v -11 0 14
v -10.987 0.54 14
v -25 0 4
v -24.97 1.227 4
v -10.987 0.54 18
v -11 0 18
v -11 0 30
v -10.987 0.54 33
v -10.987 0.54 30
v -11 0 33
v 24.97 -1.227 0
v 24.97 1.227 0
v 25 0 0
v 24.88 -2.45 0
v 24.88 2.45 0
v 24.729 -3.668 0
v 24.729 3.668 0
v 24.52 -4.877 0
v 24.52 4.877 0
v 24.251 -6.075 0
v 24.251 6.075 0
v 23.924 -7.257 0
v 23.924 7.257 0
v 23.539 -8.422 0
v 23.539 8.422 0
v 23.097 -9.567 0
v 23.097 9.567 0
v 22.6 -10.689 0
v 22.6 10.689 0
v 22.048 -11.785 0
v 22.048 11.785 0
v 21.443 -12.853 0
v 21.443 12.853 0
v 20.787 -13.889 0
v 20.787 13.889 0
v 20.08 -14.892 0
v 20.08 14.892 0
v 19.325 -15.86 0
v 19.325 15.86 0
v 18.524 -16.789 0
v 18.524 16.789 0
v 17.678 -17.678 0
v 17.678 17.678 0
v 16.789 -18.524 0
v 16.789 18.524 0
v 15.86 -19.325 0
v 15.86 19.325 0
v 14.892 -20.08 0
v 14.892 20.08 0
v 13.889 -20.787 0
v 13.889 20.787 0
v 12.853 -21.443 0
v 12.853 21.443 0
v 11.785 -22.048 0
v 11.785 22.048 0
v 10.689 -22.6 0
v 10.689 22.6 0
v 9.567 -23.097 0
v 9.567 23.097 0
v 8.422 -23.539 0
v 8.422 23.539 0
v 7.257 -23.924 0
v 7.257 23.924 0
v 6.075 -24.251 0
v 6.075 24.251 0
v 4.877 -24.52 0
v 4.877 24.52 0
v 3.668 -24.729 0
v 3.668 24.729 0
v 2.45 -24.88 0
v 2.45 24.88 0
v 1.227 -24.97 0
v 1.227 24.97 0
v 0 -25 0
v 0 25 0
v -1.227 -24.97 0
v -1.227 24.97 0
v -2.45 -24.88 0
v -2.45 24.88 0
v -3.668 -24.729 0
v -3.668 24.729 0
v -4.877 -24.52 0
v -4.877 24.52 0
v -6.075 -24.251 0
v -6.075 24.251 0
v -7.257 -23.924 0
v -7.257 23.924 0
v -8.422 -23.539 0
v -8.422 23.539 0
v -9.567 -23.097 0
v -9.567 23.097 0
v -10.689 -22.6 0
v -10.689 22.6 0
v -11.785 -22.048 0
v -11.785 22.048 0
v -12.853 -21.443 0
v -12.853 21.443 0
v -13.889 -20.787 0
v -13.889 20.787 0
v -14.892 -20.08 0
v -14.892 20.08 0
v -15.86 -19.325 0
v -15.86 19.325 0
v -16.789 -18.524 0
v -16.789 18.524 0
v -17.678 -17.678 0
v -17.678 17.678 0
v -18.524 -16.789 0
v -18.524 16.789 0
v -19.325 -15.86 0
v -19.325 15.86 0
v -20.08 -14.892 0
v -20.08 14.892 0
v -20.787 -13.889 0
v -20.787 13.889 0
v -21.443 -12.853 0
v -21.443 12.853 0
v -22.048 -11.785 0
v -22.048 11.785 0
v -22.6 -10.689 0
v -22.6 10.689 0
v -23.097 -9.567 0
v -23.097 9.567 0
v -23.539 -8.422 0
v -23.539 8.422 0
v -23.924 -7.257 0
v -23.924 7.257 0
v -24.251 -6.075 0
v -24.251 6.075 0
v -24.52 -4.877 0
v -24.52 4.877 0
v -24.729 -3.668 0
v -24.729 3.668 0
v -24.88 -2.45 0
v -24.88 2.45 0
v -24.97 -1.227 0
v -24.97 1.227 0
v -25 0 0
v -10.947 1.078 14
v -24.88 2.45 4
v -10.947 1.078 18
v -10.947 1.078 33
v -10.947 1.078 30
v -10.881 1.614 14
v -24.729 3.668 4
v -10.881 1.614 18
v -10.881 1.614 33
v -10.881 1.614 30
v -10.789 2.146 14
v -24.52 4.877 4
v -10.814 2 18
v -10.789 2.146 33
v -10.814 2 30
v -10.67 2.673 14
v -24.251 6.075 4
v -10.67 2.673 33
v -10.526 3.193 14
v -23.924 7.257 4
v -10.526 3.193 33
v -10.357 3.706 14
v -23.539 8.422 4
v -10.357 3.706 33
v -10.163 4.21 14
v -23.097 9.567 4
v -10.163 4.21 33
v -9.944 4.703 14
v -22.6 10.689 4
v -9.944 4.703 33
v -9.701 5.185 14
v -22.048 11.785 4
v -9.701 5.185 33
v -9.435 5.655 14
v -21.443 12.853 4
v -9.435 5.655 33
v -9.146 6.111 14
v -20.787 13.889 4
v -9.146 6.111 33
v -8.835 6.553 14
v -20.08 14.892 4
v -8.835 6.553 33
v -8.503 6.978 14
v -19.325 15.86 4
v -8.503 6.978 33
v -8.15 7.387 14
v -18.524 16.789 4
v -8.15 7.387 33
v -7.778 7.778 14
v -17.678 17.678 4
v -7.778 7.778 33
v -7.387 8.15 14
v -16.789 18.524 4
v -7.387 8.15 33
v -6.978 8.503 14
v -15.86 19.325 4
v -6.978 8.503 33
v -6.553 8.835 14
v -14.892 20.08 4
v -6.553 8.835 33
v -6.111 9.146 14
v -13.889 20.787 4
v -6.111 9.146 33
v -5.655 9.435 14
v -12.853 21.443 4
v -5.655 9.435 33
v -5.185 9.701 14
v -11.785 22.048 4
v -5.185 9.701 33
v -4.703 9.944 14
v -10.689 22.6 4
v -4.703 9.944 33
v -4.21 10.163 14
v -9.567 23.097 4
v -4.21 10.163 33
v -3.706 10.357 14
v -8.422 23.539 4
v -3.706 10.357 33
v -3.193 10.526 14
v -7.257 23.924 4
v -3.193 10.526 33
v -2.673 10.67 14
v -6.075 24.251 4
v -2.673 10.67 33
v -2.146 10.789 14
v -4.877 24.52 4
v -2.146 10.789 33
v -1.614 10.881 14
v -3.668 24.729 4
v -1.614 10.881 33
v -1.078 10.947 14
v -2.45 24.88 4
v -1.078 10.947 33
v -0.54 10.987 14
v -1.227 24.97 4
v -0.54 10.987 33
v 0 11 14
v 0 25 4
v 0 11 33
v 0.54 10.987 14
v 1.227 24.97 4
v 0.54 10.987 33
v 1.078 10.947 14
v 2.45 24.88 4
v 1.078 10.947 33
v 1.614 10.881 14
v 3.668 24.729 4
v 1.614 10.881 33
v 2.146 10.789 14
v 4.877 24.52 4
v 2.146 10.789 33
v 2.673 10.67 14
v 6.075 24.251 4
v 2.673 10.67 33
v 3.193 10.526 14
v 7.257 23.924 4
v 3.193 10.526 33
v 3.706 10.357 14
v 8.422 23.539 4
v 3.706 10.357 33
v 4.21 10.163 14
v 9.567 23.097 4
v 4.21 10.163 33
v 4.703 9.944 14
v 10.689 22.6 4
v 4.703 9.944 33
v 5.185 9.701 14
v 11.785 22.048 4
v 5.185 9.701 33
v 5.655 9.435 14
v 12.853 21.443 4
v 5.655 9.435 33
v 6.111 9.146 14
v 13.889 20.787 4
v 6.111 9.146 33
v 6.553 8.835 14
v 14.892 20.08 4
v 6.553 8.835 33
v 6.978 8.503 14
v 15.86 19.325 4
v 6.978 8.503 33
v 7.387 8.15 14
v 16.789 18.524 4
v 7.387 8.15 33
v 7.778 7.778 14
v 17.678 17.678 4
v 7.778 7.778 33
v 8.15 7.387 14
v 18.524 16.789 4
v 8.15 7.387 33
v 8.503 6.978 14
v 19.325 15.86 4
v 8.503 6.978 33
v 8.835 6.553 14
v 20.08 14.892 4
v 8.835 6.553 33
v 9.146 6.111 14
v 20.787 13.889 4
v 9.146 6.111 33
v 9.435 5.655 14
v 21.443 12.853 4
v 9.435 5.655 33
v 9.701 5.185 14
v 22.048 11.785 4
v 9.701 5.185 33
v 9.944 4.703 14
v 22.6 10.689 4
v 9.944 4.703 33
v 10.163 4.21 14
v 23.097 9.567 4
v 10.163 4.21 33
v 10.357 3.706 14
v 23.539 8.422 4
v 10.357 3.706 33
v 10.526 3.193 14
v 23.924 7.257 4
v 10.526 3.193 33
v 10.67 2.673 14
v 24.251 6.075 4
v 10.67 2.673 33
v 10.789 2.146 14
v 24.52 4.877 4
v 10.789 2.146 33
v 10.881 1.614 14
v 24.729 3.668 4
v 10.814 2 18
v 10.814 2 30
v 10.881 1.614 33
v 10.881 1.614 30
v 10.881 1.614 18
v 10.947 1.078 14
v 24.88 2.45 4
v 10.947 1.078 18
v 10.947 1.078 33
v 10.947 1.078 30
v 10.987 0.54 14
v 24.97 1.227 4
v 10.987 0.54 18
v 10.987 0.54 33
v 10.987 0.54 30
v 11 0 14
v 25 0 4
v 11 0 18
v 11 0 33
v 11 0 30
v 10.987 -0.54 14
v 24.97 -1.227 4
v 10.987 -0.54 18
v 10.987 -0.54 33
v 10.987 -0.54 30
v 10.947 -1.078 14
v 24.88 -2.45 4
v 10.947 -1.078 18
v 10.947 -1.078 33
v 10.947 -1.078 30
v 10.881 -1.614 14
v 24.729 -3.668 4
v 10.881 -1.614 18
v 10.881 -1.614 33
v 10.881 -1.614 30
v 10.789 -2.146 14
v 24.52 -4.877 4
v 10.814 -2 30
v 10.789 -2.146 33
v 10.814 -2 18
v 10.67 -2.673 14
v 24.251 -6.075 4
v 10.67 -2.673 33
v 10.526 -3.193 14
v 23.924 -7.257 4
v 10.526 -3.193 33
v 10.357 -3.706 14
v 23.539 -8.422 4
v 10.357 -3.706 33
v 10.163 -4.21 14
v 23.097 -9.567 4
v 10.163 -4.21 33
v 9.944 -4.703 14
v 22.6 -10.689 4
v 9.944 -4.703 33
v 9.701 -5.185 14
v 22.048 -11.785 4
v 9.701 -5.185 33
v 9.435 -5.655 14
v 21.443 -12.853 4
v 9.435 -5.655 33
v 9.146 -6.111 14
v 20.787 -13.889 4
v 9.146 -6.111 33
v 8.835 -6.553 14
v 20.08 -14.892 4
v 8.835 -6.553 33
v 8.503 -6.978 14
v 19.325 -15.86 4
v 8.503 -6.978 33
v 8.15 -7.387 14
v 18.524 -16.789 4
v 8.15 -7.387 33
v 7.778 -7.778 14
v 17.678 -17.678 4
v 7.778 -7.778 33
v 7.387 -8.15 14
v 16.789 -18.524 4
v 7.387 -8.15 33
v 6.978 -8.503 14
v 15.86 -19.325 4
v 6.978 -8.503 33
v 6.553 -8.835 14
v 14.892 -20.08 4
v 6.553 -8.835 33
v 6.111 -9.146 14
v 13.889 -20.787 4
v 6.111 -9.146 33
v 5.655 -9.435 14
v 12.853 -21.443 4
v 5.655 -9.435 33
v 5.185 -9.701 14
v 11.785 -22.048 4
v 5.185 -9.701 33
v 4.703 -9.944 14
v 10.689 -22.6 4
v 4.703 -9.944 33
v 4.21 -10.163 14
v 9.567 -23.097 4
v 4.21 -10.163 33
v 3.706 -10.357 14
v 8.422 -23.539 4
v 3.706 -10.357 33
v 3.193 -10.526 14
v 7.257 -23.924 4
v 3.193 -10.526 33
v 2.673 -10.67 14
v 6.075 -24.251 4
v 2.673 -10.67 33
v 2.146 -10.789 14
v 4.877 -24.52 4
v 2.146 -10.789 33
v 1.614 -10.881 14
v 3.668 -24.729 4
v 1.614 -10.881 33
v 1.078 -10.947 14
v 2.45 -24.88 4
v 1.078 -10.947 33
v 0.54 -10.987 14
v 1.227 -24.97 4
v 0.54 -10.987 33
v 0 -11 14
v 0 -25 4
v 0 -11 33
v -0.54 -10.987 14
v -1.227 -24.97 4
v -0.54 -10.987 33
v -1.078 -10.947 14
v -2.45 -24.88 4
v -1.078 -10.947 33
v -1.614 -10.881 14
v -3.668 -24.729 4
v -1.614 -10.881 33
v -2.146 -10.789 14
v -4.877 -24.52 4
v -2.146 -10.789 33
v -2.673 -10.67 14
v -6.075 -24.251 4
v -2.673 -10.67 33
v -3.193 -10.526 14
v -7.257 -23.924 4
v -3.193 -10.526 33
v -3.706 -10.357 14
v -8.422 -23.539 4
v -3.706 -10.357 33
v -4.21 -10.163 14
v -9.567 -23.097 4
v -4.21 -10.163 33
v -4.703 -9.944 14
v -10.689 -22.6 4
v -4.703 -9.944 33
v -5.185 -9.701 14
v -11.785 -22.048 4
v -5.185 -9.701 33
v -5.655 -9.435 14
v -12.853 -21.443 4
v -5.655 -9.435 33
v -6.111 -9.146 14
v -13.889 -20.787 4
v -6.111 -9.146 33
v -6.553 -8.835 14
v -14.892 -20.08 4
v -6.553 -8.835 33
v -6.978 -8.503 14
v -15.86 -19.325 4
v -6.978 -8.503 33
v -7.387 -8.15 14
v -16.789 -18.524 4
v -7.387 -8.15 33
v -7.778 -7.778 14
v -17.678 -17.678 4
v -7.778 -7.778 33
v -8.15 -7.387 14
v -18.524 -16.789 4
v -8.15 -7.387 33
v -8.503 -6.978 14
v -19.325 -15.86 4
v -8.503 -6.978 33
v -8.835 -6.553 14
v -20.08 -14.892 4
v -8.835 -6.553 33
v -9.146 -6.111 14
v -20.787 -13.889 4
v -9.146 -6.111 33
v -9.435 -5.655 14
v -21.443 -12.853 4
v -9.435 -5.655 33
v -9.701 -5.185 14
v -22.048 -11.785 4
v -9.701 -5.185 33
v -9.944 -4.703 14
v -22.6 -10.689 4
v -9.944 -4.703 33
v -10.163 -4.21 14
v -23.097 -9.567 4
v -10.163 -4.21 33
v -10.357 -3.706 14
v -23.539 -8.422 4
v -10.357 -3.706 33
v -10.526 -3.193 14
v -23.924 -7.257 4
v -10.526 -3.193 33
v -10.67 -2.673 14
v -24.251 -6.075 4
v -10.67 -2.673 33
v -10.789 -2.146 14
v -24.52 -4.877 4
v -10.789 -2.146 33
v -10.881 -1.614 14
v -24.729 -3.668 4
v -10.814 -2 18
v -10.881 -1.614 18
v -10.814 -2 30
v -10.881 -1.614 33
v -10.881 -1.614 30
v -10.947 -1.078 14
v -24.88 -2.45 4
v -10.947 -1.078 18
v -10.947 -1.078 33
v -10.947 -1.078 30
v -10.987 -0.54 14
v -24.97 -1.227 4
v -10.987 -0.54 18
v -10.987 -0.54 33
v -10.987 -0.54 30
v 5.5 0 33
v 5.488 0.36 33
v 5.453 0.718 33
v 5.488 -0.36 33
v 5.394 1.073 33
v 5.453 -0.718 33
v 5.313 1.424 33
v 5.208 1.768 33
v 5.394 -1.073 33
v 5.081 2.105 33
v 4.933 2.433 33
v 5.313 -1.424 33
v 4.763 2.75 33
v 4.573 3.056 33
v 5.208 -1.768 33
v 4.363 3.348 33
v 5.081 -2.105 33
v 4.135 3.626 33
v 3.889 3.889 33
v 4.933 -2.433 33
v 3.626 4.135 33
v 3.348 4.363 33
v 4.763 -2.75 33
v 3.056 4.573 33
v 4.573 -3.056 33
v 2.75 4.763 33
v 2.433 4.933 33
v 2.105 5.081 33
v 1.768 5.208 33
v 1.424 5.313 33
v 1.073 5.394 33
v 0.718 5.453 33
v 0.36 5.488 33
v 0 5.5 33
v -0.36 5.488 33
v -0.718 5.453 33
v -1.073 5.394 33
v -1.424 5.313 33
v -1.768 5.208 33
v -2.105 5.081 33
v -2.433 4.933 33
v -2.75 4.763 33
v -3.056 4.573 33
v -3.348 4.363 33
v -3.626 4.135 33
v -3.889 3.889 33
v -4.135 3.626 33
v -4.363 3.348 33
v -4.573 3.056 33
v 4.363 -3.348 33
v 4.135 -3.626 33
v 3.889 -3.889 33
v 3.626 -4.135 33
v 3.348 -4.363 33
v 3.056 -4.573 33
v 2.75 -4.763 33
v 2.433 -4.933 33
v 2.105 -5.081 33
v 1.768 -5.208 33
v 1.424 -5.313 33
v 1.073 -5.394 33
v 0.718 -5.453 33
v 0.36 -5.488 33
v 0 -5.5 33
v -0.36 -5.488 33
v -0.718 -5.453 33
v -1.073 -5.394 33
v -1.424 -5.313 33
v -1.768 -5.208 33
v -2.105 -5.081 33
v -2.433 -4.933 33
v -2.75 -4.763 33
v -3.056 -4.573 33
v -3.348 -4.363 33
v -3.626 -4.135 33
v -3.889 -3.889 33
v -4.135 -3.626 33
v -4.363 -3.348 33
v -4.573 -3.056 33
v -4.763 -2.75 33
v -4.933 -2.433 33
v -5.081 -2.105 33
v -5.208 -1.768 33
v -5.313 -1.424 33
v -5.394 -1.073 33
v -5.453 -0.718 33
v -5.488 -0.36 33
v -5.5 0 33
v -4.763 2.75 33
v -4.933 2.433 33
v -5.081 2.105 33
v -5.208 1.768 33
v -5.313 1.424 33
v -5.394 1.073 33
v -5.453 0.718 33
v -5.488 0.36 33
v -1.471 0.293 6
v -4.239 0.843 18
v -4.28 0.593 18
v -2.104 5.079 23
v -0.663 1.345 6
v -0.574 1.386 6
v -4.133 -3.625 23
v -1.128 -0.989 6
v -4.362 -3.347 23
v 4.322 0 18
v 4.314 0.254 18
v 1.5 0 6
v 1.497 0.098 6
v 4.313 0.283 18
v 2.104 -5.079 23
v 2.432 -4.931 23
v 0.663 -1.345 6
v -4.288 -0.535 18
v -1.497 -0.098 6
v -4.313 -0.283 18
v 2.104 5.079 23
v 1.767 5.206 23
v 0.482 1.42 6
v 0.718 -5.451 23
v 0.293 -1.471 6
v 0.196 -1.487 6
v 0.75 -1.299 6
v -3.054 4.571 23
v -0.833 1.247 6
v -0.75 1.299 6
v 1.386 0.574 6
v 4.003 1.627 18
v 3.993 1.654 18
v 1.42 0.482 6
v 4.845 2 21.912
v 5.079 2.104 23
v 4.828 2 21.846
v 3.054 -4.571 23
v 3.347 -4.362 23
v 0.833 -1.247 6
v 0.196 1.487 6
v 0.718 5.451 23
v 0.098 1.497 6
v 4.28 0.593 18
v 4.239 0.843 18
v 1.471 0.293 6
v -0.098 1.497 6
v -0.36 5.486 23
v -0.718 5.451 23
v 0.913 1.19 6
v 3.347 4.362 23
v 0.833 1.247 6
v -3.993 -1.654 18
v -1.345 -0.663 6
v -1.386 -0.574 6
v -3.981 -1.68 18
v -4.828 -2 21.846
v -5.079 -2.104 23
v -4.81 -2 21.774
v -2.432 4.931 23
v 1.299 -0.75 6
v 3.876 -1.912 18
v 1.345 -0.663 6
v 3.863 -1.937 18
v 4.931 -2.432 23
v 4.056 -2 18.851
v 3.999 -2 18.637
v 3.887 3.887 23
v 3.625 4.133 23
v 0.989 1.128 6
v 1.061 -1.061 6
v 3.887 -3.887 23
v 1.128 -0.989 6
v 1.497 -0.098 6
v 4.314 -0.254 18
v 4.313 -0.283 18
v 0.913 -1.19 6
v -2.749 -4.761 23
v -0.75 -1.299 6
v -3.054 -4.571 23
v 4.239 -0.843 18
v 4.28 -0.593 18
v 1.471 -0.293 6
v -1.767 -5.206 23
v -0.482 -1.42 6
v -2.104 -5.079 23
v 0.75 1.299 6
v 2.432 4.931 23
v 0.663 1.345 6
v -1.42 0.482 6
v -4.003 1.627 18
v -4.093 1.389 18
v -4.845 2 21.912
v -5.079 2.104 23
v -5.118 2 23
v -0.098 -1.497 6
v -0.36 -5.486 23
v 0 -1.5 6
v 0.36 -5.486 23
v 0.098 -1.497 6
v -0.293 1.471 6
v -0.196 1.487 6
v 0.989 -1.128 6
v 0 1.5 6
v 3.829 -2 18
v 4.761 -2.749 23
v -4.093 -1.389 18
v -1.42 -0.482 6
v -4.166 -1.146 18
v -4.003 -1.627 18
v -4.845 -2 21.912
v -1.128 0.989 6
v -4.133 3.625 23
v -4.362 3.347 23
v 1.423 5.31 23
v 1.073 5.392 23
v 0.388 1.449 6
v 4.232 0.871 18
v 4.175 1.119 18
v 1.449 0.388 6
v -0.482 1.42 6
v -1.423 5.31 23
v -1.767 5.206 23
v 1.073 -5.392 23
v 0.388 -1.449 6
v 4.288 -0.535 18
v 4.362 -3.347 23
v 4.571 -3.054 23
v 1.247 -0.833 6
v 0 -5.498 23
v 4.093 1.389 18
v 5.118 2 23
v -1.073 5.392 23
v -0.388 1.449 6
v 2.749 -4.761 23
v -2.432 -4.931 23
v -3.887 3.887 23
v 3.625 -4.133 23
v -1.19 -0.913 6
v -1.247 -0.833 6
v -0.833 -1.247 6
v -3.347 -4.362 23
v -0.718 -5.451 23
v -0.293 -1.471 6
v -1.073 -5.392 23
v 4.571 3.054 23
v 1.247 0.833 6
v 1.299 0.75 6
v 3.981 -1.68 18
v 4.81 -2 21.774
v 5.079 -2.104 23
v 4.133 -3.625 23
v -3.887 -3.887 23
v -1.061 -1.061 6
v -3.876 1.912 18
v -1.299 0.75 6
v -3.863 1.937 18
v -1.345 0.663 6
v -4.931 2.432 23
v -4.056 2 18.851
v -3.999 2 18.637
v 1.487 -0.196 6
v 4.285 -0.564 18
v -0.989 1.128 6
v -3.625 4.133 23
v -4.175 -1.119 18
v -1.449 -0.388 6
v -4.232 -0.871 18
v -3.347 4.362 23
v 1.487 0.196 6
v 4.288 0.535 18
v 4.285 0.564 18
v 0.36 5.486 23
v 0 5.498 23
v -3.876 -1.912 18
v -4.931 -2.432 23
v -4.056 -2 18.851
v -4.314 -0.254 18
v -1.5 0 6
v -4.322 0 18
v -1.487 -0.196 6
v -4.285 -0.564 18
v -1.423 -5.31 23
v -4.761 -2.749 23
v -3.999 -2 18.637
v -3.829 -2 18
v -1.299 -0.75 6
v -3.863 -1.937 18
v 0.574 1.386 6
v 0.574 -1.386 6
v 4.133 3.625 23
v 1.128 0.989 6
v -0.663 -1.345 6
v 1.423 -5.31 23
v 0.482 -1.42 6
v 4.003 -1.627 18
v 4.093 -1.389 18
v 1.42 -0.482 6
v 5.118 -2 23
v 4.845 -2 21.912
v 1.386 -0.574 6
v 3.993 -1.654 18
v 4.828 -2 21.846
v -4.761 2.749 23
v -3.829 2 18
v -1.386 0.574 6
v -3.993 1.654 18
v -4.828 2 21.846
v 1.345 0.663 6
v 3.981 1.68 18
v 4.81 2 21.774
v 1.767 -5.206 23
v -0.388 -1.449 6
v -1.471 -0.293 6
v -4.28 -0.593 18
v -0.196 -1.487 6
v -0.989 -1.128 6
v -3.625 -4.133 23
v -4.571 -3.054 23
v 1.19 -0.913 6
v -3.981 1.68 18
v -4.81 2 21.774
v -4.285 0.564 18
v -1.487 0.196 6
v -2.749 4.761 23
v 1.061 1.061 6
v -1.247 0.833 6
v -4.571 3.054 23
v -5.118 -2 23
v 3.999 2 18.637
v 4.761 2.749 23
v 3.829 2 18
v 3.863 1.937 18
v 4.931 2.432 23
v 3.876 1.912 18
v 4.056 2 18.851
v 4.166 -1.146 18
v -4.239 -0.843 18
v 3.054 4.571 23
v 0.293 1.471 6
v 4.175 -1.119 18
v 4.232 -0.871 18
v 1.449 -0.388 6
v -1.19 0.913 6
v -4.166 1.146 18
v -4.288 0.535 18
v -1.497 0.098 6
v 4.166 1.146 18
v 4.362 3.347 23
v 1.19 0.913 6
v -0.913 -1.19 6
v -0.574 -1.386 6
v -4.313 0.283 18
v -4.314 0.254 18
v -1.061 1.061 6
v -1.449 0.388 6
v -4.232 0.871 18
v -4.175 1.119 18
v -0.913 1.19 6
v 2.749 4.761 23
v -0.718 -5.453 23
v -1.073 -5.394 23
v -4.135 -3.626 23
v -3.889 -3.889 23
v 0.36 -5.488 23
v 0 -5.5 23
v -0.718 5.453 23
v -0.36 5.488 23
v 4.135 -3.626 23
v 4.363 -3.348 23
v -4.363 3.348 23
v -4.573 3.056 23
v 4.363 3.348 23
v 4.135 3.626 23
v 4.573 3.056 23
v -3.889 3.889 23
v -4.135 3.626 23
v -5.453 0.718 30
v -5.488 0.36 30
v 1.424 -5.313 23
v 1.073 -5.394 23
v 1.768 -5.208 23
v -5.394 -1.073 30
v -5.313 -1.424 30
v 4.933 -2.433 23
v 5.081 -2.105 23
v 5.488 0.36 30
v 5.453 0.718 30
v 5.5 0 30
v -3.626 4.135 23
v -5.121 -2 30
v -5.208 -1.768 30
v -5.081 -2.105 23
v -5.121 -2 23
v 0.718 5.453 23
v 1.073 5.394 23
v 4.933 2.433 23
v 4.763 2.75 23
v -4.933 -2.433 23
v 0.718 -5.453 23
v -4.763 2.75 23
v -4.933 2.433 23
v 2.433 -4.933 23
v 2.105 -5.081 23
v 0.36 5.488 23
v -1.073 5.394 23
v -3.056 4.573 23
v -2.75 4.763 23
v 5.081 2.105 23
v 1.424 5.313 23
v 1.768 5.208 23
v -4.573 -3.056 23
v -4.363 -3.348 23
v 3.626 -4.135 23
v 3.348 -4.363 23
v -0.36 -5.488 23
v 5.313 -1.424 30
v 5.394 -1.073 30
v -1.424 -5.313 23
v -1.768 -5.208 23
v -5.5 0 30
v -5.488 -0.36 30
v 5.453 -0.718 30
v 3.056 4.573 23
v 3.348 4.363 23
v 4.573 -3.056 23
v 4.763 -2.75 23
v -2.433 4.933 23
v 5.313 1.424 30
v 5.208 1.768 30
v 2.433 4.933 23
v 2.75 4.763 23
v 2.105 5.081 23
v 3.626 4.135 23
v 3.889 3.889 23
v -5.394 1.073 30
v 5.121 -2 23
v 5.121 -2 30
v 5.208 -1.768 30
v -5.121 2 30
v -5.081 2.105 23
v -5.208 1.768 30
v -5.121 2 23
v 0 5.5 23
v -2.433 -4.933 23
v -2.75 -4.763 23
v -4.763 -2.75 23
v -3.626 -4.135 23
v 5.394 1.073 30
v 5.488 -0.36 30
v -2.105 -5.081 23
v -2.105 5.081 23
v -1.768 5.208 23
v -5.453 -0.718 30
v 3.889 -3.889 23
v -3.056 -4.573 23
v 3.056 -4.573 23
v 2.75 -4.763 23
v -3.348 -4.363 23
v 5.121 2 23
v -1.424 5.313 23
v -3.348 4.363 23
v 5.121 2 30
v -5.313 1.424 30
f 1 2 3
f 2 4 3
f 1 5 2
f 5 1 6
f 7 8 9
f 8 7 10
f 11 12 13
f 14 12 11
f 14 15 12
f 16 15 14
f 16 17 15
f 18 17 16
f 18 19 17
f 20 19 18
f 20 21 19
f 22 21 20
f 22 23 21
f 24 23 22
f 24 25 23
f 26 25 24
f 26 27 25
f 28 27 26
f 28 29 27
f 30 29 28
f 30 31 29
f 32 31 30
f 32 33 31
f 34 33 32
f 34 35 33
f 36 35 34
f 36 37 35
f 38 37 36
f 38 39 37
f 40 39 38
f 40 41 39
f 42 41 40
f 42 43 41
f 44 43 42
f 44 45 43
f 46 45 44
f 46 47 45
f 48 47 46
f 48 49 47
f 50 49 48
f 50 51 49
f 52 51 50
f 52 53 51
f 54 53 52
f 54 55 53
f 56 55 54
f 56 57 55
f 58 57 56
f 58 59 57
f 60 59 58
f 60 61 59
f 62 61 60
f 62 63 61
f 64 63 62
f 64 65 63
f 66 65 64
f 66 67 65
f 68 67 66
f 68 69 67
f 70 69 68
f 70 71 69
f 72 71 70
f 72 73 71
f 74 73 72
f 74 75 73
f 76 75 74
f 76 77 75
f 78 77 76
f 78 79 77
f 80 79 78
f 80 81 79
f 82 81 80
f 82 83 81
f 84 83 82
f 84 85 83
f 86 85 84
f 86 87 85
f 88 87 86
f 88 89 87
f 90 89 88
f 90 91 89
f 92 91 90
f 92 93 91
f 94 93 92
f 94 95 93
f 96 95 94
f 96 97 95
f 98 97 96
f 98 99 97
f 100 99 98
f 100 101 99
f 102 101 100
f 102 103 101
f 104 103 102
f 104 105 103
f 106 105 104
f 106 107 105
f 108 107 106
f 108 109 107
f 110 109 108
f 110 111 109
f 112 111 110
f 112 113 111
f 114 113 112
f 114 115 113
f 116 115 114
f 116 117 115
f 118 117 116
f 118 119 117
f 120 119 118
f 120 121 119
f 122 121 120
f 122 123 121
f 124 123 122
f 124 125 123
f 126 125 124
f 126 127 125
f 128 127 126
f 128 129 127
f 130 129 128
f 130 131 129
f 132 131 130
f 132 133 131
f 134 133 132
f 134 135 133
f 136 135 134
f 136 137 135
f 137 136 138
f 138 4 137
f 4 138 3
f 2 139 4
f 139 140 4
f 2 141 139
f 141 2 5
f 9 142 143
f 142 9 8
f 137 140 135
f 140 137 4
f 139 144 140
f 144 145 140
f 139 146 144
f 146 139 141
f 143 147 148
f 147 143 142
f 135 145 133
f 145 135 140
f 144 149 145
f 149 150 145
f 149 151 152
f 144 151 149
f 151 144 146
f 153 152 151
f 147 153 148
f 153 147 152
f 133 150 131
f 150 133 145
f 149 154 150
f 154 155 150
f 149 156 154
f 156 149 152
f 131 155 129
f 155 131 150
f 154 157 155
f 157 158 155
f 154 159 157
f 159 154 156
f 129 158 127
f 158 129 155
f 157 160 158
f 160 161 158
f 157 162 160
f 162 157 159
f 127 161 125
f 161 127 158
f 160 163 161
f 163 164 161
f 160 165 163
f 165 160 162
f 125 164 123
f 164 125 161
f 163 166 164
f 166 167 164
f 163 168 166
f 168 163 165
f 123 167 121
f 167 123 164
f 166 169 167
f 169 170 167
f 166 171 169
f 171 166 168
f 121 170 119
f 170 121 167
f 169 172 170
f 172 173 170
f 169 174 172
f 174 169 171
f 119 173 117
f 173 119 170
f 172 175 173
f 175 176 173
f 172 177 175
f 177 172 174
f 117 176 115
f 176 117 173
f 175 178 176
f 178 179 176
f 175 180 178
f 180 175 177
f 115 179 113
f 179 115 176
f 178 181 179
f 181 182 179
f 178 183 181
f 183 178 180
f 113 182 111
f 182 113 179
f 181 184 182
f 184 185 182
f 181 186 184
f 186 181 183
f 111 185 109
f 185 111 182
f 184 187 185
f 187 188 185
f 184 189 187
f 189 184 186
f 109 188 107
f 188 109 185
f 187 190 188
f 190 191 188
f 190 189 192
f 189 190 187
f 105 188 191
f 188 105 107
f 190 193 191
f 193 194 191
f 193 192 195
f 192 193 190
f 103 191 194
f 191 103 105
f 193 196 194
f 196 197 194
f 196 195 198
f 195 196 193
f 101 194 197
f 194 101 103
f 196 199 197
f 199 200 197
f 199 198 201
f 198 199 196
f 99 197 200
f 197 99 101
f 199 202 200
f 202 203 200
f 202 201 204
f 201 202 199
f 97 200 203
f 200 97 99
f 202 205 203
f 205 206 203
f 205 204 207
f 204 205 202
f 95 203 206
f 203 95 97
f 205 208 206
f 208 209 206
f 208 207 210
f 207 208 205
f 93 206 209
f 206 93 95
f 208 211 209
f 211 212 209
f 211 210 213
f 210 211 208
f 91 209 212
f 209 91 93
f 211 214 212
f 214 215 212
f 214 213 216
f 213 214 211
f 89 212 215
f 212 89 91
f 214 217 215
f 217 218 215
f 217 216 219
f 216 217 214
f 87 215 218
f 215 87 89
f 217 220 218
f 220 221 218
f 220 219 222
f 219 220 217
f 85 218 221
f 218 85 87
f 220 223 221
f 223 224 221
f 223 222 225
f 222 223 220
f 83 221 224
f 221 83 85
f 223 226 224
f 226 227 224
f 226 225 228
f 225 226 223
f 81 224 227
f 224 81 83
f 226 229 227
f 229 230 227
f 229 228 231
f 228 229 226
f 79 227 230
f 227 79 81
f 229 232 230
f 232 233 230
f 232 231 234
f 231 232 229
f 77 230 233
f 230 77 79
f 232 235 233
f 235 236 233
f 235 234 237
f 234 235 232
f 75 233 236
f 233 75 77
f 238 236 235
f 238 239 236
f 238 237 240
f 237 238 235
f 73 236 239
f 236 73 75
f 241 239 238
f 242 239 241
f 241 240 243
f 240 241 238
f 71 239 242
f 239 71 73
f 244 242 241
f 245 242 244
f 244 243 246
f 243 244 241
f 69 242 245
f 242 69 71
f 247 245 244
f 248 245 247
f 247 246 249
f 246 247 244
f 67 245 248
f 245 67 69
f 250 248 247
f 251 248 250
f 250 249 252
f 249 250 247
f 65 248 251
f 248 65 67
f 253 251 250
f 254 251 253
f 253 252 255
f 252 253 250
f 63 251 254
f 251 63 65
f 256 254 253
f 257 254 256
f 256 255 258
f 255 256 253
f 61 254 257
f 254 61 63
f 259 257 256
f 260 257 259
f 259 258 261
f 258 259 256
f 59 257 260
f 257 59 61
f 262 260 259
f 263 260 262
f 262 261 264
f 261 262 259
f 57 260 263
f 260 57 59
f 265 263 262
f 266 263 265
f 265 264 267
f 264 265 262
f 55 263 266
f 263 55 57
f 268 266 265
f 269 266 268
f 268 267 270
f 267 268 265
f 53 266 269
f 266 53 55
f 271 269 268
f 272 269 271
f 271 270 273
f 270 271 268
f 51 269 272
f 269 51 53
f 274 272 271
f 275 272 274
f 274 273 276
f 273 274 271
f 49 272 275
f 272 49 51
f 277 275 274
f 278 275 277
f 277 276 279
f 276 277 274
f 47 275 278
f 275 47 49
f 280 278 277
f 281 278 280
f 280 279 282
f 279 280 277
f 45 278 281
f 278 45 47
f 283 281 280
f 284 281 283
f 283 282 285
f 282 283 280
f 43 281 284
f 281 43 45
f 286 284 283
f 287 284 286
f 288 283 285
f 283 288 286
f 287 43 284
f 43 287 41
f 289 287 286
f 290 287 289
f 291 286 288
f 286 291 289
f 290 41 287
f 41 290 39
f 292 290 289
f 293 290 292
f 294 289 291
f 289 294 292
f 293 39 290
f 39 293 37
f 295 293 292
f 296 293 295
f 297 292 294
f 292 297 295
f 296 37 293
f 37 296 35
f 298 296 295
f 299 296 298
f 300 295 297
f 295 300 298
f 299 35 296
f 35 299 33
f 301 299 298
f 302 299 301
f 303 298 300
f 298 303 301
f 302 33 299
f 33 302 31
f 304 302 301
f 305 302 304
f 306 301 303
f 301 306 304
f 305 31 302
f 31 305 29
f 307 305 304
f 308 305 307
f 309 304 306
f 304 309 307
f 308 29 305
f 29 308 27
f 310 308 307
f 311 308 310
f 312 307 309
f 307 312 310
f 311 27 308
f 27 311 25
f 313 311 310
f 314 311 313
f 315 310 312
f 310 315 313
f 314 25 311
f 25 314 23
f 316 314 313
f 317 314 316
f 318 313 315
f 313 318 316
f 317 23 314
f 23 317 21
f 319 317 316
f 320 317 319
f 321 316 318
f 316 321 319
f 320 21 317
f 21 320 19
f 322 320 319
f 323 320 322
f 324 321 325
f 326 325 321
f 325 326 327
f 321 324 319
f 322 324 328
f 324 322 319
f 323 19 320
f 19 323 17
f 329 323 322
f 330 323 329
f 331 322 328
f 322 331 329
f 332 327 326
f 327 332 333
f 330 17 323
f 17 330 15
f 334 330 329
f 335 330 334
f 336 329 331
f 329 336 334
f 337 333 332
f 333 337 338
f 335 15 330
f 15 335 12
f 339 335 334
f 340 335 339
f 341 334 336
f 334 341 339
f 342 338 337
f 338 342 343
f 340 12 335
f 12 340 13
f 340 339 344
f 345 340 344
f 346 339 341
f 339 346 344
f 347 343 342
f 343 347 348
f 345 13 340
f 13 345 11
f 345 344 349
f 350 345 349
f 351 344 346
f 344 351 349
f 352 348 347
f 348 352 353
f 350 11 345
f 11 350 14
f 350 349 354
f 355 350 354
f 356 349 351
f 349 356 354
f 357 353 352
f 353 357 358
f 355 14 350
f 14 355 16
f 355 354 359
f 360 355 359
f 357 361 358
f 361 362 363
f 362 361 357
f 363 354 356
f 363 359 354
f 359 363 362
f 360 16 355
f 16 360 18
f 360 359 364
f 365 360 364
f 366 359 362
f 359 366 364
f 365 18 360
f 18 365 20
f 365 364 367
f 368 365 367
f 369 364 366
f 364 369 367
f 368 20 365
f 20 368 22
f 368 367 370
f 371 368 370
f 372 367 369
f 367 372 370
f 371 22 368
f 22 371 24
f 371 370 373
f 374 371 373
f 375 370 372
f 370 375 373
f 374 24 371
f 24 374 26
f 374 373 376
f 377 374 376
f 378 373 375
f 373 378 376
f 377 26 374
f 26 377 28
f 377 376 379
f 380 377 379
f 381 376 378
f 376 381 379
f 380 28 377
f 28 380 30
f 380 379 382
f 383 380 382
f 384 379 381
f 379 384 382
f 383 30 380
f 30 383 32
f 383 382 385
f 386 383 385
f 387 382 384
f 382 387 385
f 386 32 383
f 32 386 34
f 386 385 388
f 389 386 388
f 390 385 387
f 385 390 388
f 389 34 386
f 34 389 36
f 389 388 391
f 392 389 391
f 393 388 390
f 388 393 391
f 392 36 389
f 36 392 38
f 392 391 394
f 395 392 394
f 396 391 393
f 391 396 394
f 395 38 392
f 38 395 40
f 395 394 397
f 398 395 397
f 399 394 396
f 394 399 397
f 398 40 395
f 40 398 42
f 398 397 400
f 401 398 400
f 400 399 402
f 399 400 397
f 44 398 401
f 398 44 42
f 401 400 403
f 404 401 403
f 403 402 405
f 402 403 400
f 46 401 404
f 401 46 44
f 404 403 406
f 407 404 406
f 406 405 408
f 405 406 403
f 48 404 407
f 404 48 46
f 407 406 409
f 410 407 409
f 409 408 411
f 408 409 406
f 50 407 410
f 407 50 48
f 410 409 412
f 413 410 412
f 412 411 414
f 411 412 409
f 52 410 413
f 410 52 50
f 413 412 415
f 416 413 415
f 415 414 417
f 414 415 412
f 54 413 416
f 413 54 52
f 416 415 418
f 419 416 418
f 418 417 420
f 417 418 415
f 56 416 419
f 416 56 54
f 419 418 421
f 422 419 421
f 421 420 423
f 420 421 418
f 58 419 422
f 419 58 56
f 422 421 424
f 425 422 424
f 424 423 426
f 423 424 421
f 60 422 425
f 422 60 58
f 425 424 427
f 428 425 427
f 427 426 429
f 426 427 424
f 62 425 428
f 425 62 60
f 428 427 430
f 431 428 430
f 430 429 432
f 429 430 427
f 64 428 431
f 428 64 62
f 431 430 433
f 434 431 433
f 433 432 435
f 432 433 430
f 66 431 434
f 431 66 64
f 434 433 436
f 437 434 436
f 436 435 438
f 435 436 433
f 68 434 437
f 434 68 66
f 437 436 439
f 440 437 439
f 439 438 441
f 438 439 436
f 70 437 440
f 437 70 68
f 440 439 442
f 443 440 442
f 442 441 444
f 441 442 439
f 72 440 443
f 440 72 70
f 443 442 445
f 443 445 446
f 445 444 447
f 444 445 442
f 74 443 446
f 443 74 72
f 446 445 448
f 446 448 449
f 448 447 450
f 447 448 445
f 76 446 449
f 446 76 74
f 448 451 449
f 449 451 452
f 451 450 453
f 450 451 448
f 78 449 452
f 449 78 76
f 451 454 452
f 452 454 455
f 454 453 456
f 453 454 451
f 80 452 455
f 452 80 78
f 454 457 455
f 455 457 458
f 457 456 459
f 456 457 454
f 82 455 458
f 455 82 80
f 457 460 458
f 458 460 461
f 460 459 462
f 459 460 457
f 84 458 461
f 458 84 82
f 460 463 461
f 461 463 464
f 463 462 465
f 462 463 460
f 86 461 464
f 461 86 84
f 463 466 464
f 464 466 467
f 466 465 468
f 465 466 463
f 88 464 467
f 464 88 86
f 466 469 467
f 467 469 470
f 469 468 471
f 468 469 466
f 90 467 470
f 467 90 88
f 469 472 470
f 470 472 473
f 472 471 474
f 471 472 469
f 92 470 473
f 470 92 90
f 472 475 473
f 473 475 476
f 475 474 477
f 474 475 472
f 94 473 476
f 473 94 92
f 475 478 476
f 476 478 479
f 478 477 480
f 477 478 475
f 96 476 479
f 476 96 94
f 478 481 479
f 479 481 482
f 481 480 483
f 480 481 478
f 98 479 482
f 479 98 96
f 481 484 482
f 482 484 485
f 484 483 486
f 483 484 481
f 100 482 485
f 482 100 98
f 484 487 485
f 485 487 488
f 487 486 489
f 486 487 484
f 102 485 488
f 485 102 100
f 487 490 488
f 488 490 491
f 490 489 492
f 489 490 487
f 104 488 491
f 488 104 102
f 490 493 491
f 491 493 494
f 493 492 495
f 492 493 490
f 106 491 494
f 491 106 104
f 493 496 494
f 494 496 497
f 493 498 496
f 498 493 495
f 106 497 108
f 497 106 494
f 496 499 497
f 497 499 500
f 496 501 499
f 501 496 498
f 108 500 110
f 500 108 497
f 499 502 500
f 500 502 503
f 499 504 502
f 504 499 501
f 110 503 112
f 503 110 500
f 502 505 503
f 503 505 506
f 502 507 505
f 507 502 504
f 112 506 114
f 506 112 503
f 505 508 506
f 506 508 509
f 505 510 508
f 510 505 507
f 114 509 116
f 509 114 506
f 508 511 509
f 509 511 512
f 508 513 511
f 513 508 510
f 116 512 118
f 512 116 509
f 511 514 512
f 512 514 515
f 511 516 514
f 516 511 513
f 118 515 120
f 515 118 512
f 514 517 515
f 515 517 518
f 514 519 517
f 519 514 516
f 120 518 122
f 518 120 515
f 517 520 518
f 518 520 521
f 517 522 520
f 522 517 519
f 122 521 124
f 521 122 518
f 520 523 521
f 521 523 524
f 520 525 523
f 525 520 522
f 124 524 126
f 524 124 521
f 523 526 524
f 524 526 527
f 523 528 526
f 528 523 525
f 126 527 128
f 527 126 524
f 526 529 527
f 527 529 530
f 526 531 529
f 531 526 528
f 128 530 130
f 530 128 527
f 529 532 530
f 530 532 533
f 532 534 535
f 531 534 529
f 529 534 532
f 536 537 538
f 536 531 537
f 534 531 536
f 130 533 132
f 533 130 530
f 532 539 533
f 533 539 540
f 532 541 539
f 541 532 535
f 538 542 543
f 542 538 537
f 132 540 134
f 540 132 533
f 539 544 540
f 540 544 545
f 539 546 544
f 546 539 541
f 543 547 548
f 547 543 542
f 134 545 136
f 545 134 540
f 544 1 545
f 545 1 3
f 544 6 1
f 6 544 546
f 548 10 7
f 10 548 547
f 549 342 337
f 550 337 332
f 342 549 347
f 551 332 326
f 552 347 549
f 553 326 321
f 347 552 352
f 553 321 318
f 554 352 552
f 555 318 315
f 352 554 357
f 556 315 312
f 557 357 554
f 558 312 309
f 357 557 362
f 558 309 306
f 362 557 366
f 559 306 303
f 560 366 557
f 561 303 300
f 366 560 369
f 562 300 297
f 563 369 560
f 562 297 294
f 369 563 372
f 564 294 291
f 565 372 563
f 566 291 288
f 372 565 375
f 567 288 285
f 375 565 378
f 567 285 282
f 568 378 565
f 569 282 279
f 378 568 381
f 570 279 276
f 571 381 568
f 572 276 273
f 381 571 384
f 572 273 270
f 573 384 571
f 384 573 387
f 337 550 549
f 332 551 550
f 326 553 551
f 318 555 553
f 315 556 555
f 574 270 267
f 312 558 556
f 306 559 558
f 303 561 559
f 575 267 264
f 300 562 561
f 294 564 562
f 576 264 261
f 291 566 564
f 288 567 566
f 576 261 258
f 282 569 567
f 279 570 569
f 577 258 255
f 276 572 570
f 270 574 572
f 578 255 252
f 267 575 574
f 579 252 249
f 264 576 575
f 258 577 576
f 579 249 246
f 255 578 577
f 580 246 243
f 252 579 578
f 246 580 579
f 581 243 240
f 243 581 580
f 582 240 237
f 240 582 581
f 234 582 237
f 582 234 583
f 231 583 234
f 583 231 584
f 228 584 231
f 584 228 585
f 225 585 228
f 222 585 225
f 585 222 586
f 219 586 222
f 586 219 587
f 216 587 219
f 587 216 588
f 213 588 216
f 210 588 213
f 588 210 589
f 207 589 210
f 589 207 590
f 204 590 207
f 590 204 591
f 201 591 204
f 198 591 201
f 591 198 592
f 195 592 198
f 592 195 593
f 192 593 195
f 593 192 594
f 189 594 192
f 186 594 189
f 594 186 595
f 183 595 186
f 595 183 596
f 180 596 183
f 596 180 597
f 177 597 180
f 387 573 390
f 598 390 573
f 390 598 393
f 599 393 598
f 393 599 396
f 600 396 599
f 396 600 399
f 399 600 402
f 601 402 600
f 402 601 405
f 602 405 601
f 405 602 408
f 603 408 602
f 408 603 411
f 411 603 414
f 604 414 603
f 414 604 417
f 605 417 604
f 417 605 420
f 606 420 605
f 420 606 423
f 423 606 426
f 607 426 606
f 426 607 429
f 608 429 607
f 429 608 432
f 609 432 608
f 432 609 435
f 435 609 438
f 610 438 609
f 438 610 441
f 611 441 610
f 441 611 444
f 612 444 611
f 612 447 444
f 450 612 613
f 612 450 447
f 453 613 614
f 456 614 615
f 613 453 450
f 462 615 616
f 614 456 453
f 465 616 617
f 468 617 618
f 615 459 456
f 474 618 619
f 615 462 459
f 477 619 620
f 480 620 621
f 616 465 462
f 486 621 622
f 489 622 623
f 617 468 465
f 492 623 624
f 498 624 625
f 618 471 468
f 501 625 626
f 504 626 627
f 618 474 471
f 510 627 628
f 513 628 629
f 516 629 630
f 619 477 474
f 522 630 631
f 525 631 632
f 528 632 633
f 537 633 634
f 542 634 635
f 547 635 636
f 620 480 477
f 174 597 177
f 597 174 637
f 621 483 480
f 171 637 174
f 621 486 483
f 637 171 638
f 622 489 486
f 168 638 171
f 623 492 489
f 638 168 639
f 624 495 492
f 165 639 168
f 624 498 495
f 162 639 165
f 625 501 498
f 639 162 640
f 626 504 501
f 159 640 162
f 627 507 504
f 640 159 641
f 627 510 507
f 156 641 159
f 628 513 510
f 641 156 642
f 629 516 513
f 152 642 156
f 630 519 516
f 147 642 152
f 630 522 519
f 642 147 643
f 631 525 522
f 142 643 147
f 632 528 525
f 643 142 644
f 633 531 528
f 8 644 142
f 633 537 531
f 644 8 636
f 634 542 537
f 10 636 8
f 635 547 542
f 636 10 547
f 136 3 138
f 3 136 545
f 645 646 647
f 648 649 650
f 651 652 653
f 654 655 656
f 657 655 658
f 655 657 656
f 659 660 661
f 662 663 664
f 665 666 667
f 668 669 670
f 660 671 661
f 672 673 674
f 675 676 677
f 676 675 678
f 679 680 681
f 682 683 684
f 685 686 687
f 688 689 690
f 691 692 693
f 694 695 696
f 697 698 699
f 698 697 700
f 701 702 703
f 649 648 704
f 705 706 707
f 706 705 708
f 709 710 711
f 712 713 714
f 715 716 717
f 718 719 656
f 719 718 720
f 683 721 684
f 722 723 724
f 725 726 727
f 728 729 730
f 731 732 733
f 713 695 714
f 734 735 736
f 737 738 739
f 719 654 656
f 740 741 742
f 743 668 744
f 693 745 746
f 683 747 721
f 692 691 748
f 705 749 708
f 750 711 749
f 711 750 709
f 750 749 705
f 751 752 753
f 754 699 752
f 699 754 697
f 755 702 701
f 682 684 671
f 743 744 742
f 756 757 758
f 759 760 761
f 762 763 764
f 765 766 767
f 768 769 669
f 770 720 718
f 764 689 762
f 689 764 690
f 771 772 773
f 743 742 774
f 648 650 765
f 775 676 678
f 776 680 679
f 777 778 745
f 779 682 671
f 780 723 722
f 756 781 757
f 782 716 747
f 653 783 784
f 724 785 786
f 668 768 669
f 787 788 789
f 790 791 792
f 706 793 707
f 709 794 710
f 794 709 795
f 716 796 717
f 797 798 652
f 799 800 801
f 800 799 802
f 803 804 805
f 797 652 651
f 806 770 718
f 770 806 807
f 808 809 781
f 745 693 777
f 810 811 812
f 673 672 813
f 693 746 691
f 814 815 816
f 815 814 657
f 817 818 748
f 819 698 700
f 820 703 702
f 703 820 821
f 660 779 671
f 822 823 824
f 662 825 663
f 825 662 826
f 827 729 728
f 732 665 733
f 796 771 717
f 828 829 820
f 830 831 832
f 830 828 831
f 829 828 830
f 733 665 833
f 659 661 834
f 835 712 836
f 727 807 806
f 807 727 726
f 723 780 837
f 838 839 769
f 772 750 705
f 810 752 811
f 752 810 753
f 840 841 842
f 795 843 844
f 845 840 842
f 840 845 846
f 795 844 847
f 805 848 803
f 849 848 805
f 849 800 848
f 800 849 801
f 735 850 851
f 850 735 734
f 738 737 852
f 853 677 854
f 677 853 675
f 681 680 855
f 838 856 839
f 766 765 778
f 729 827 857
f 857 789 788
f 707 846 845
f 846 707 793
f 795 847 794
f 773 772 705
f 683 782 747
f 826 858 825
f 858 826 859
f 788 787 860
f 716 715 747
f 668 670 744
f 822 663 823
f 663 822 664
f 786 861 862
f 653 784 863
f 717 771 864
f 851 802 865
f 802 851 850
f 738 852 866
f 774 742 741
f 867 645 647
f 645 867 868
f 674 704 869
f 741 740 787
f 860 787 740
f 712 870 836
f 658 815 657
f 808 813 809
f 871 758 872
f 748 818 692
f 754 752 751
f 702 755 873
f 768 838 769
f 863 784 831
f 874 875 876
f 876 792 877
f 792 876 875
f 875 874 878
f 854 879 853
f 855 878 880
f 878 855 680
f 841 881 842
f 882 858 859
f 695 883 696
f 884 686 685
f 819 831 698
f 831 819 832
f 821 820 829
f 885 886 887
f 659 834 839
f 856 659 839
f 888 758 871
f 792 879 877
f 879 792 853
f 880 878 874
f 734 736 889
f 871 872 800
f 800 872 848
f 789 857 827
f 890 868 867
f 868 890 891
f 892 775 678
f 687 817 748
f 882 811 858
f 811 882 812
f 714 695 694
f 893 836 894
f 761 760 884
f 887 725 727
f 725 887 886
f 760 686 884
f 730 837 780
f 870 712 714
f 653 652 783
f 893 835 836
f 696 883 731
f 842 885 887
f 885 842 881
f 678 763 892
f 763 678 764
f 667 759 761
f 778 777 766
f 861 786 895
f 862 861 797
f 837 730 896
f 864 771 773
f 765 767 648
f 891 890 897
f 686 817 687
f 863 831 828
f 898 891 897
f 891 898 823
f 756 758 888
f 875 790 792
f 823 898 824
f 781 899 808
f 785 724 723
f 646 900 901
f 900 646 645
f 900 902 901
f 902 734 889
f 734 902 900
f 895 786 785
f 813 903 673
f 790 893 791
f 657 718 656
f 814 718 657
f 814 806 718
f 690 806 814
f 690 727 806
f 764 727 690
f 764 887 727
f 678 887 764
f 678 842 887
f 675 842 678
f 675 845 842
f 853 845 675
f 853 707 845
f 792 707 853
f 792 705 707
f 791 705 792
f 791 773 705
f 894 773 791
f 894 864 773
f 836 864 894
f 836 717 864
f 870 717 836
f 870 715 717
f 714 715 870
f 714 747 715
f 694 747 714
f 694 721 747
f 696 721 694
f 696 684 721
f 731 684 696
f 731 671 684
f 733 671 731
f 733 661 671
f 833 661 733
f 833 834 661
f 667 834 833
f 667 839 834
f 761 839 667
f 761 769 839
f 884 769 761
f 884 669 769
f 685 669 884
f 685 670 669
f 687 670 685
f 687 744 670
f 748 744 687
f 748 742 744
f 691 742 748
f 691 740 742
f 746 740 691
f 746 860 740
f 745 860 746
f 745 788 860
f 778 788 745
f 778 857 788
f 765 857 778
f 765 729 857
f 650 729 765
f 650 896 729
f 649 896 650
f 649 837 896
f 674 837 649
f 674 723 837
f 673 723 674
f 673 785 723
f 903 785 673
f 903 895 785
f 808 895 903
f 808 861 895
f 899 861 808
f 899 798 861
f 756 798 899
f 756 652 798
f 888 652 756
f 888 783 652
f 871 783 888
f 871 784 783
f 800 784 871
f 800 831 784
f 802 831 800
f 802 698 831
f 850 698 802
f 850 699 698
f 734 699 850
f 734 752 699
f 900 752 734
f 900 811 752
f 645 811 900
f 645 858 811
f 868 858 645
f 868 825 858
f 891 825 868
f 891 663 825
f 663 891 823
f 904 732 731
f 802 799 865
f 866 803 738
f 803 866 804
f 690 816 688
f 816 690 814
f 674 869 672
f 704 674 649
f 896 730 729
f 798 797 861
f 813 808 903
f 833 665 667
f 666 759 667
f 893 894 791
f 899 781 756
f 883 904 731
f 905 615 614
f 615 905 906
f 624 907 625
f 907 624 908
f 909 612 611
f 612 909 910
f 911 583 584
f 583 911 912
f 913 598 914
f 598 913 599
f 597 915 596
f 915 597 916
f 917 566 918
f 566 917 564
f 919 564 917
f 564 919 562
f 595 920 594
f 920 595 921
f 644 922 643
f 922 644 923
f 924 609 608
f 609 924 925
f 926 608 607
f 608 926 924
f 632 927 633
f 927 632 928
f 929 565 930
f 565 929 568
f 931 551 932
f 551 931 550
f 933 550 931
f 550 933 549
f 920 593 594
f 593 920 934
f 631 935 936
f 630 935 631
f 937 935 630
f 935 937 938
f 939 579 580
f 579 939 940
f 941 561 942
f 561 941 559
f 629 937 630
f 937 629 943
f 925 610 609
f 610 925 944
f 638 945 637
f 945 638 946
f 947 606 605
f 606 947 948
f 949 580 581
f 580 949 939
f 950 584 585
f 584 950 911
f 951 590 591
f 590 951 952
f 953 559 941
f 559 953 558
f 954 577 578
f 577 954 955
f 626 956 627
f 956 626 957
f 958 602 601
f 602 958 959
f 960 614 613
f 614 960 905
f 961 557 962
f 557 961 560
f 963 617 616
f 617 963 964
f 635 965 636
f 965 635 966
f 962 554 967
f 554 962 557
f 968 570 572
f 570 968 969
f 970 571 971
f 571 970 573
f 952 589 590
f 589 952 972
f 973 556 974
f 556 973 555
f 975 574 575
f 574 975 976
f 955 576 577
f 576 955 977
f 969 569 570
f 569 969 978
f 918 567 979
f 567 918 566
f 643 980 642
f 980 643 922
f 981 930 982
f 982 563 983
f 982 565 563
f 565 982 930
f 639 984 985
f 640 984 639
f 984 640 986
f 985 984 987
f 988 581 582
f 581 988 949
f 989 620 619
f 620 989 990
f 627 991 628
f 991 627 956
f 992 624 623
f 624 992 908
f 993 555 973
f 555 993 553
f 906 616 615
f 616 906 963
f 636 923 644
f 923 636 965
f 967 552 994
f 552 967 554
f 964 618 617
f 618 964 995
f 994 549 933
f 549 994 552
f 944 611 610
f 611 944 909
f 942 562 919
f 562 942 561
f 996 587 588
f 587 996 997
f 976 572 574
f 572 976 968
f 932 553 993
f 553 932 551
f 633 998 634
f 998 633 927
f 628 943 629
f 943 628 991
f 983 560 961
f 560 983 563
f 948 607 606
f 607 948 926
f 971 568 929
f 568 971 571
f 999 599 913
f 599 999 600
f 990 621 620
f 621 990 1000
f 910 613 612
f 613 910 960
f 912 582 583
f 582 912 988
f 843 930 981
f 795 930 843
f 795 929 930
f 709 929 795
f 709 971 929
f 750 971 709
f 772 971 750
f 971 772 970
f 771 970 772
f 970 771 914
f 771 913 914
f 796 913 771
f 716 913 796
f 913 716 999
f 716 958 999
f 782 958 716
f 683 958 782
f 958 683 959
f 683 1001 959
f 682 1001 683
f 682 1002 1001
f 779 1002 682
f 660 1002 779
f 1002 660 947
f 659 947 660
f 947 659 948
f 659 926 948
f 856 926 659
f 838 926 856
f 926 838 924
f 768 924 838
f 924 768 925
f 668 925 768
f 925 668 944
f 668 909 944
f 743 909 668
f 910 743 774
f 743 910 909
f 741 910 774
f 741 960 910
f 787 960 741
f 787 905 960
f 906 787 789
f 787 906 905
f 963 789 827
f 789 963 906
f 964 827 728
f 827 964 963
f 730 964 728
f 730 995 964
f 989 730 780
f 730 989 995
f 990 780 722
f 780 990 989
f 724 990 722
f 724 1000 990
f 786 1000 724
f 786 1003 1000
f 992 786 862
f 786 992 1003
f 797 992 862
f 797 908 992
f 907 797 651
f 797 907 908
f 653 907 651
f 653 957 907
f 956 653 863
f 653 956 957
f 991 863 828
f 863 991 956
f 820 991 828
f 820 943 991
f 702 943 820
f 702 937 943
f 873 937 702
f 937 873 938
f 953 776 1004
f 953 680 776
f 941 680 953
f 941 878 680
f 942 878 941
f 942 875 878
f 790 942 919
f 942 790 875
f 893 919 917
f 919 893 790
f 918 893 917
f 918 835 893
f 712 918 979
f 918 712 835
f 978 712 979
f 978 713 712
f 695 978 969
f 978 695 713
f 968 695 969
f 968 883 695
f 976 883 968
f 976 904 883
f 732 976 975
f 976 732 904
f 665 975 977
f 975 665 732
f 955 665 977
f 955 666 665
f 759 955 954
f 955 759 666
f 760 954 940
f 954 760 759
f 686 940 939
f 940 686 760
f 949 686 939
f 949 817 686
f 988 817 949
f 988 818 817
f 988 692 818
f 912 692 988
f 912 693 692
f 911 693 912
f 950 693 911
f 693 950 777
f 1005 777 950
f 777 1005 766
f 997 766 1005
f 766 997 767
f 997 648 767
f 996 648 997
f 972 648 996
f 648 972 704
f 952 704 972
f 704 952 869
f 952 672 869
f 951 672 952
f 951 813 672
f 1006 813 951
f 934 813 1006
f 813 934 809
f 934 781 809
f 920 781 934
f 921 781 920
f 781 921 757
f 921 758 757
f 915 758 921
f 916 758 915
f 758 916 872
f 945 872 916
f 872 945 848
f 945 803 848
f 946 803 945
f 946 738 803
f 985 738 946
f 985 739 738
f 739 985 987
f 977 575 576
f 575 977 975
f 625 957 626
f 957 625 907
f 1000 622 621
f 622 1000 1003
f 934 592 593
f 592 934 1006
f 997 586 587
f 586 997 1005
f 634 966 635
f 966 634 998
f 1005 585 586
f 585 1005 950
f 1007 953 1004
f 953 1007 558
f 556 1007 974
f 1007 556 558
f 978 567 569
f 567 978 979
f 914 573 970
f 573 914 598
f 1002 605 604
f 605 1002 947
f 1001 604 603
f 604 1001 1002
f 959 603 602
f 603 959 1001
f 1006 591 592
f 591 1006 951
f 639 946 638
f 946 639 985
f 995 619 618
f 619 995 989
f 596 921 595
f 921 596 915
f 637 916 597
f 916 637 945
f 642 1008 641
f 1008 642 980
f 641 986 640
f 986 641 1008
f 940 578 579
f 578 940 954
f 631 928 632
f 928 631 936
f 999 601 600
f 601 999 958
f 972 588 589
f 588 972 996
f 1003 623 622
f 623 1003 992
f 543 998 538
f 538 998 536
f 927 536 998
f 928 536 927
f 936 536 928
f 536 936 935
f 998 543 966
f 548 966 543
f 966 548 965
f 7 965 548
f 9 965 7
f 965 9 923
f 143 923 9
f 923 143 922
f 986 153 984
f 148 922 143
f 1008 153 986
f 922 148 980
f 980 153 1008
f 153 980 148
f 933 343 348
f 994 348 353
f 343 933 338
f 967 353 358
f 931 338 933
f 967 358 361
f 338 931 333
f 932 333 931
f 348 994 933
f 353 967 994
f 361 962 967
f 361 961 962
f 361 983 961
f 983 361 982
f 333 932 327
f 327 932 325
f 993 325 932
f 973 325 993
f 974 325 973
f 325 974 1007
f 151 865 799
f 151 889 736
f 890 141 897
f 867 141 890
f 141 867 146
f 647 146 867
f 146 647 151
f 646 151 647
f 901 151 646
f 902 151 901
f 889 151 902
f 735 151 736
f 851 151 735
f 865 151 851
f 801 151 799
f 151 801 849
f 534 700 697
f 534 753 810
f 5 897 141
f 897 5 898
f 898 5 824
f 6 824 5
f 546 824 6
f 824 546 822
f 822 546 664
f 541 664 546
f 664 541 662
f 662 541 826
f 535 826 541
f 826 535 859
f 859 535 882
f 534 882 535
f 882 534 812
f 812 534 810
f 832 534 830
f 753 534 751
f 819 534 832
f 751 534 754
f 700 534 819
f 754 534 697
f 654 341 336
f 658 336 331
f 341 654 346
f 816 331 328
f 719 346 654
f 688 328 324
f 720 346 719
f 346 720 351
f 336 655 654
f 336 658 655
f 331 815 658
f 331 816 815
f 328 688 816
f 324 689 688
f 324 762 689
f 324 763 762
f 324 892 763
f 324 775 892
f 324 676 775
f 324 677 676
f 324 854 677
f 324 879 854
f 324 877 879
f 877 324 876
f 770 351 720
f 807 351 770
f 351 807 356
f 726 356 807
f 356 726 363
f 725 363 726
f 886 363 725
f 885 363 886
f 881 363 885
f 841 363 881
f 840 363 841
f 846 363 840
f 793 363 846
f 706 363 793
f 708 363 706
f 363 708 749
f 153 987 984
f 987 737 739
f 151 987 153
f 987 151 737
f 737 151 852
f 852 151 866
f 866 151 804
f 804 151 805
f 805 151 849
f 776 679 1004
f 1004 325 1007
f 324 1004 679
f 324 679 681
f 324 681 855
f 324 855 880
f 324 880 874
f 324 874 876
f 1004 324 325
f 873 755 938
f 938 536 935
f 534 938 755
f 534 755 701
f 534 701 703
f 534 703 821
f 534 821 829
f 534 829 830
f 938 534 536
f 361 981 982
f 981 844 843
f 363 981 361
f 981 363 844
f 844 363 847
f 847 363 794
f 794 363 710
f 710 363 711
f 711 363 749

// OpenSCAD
// KNOWN-WRONG PART (must fail): the window is cut through both walls (+X and -X)
// Weighing stand that holds one 1.5 mL microcentrifuge tube upright on a balance pan
// Category: quick fixes. A revolved stand (base disc, cone, column) with a seat that follows the
// tube's conical tip, and a viewing window through the column wall on the +X side.
// Print: PLA or PETG, standing up, 0.2 mm layers. Tare the balance with the stand on it.
// SPDX-License-Identifier: CERN-OHL-P-2.0

/* [Stand] */
base_d = 50;  base_h = 4;       // disc z = 0 .. 4
col_d = 22;   cone_top = 14;    // cone 50 -> 22 mm from z = 4 to 14
height = 33;                    // column from z = 14 to 33
seat_d = 11;  seat_cyl_z = 23;  // 11 mm from the top down to z = 23 ...
tip_d = 3;    tip_z = 6;        // ... then a cone narrowing to 3 mm at z = 6
win_w = 4;    win_z = [18, 30]; // viewing window through the +X wall

/* [Hidden] */
$fn = 128;
eps = 0.01;

difference() {
    rotate_extrude() polygon([[0, 0], [base_d / 2, 0], [base_d / 2, base_h], [col_d / 2, cone_top],
                              [col_d / 2, height], [0, height]]);
    translate([0, 0, tip_z]) cylinder(d1 = tip_d, d2 = seat_d, h = seat_cyl_z - tip_z + eps, $fn = 96);
    translate([0, 0, seat_cyl_z]) cylinder(d = seat_d, h = height - seat_cyl_z + 1, $fn = 96);
    translate([-col_d / 2 - 1, -win_w / 2, win_z[0]]) cube([col_d + 2, win_w, win_z[1] - win_z[0]]);
}
